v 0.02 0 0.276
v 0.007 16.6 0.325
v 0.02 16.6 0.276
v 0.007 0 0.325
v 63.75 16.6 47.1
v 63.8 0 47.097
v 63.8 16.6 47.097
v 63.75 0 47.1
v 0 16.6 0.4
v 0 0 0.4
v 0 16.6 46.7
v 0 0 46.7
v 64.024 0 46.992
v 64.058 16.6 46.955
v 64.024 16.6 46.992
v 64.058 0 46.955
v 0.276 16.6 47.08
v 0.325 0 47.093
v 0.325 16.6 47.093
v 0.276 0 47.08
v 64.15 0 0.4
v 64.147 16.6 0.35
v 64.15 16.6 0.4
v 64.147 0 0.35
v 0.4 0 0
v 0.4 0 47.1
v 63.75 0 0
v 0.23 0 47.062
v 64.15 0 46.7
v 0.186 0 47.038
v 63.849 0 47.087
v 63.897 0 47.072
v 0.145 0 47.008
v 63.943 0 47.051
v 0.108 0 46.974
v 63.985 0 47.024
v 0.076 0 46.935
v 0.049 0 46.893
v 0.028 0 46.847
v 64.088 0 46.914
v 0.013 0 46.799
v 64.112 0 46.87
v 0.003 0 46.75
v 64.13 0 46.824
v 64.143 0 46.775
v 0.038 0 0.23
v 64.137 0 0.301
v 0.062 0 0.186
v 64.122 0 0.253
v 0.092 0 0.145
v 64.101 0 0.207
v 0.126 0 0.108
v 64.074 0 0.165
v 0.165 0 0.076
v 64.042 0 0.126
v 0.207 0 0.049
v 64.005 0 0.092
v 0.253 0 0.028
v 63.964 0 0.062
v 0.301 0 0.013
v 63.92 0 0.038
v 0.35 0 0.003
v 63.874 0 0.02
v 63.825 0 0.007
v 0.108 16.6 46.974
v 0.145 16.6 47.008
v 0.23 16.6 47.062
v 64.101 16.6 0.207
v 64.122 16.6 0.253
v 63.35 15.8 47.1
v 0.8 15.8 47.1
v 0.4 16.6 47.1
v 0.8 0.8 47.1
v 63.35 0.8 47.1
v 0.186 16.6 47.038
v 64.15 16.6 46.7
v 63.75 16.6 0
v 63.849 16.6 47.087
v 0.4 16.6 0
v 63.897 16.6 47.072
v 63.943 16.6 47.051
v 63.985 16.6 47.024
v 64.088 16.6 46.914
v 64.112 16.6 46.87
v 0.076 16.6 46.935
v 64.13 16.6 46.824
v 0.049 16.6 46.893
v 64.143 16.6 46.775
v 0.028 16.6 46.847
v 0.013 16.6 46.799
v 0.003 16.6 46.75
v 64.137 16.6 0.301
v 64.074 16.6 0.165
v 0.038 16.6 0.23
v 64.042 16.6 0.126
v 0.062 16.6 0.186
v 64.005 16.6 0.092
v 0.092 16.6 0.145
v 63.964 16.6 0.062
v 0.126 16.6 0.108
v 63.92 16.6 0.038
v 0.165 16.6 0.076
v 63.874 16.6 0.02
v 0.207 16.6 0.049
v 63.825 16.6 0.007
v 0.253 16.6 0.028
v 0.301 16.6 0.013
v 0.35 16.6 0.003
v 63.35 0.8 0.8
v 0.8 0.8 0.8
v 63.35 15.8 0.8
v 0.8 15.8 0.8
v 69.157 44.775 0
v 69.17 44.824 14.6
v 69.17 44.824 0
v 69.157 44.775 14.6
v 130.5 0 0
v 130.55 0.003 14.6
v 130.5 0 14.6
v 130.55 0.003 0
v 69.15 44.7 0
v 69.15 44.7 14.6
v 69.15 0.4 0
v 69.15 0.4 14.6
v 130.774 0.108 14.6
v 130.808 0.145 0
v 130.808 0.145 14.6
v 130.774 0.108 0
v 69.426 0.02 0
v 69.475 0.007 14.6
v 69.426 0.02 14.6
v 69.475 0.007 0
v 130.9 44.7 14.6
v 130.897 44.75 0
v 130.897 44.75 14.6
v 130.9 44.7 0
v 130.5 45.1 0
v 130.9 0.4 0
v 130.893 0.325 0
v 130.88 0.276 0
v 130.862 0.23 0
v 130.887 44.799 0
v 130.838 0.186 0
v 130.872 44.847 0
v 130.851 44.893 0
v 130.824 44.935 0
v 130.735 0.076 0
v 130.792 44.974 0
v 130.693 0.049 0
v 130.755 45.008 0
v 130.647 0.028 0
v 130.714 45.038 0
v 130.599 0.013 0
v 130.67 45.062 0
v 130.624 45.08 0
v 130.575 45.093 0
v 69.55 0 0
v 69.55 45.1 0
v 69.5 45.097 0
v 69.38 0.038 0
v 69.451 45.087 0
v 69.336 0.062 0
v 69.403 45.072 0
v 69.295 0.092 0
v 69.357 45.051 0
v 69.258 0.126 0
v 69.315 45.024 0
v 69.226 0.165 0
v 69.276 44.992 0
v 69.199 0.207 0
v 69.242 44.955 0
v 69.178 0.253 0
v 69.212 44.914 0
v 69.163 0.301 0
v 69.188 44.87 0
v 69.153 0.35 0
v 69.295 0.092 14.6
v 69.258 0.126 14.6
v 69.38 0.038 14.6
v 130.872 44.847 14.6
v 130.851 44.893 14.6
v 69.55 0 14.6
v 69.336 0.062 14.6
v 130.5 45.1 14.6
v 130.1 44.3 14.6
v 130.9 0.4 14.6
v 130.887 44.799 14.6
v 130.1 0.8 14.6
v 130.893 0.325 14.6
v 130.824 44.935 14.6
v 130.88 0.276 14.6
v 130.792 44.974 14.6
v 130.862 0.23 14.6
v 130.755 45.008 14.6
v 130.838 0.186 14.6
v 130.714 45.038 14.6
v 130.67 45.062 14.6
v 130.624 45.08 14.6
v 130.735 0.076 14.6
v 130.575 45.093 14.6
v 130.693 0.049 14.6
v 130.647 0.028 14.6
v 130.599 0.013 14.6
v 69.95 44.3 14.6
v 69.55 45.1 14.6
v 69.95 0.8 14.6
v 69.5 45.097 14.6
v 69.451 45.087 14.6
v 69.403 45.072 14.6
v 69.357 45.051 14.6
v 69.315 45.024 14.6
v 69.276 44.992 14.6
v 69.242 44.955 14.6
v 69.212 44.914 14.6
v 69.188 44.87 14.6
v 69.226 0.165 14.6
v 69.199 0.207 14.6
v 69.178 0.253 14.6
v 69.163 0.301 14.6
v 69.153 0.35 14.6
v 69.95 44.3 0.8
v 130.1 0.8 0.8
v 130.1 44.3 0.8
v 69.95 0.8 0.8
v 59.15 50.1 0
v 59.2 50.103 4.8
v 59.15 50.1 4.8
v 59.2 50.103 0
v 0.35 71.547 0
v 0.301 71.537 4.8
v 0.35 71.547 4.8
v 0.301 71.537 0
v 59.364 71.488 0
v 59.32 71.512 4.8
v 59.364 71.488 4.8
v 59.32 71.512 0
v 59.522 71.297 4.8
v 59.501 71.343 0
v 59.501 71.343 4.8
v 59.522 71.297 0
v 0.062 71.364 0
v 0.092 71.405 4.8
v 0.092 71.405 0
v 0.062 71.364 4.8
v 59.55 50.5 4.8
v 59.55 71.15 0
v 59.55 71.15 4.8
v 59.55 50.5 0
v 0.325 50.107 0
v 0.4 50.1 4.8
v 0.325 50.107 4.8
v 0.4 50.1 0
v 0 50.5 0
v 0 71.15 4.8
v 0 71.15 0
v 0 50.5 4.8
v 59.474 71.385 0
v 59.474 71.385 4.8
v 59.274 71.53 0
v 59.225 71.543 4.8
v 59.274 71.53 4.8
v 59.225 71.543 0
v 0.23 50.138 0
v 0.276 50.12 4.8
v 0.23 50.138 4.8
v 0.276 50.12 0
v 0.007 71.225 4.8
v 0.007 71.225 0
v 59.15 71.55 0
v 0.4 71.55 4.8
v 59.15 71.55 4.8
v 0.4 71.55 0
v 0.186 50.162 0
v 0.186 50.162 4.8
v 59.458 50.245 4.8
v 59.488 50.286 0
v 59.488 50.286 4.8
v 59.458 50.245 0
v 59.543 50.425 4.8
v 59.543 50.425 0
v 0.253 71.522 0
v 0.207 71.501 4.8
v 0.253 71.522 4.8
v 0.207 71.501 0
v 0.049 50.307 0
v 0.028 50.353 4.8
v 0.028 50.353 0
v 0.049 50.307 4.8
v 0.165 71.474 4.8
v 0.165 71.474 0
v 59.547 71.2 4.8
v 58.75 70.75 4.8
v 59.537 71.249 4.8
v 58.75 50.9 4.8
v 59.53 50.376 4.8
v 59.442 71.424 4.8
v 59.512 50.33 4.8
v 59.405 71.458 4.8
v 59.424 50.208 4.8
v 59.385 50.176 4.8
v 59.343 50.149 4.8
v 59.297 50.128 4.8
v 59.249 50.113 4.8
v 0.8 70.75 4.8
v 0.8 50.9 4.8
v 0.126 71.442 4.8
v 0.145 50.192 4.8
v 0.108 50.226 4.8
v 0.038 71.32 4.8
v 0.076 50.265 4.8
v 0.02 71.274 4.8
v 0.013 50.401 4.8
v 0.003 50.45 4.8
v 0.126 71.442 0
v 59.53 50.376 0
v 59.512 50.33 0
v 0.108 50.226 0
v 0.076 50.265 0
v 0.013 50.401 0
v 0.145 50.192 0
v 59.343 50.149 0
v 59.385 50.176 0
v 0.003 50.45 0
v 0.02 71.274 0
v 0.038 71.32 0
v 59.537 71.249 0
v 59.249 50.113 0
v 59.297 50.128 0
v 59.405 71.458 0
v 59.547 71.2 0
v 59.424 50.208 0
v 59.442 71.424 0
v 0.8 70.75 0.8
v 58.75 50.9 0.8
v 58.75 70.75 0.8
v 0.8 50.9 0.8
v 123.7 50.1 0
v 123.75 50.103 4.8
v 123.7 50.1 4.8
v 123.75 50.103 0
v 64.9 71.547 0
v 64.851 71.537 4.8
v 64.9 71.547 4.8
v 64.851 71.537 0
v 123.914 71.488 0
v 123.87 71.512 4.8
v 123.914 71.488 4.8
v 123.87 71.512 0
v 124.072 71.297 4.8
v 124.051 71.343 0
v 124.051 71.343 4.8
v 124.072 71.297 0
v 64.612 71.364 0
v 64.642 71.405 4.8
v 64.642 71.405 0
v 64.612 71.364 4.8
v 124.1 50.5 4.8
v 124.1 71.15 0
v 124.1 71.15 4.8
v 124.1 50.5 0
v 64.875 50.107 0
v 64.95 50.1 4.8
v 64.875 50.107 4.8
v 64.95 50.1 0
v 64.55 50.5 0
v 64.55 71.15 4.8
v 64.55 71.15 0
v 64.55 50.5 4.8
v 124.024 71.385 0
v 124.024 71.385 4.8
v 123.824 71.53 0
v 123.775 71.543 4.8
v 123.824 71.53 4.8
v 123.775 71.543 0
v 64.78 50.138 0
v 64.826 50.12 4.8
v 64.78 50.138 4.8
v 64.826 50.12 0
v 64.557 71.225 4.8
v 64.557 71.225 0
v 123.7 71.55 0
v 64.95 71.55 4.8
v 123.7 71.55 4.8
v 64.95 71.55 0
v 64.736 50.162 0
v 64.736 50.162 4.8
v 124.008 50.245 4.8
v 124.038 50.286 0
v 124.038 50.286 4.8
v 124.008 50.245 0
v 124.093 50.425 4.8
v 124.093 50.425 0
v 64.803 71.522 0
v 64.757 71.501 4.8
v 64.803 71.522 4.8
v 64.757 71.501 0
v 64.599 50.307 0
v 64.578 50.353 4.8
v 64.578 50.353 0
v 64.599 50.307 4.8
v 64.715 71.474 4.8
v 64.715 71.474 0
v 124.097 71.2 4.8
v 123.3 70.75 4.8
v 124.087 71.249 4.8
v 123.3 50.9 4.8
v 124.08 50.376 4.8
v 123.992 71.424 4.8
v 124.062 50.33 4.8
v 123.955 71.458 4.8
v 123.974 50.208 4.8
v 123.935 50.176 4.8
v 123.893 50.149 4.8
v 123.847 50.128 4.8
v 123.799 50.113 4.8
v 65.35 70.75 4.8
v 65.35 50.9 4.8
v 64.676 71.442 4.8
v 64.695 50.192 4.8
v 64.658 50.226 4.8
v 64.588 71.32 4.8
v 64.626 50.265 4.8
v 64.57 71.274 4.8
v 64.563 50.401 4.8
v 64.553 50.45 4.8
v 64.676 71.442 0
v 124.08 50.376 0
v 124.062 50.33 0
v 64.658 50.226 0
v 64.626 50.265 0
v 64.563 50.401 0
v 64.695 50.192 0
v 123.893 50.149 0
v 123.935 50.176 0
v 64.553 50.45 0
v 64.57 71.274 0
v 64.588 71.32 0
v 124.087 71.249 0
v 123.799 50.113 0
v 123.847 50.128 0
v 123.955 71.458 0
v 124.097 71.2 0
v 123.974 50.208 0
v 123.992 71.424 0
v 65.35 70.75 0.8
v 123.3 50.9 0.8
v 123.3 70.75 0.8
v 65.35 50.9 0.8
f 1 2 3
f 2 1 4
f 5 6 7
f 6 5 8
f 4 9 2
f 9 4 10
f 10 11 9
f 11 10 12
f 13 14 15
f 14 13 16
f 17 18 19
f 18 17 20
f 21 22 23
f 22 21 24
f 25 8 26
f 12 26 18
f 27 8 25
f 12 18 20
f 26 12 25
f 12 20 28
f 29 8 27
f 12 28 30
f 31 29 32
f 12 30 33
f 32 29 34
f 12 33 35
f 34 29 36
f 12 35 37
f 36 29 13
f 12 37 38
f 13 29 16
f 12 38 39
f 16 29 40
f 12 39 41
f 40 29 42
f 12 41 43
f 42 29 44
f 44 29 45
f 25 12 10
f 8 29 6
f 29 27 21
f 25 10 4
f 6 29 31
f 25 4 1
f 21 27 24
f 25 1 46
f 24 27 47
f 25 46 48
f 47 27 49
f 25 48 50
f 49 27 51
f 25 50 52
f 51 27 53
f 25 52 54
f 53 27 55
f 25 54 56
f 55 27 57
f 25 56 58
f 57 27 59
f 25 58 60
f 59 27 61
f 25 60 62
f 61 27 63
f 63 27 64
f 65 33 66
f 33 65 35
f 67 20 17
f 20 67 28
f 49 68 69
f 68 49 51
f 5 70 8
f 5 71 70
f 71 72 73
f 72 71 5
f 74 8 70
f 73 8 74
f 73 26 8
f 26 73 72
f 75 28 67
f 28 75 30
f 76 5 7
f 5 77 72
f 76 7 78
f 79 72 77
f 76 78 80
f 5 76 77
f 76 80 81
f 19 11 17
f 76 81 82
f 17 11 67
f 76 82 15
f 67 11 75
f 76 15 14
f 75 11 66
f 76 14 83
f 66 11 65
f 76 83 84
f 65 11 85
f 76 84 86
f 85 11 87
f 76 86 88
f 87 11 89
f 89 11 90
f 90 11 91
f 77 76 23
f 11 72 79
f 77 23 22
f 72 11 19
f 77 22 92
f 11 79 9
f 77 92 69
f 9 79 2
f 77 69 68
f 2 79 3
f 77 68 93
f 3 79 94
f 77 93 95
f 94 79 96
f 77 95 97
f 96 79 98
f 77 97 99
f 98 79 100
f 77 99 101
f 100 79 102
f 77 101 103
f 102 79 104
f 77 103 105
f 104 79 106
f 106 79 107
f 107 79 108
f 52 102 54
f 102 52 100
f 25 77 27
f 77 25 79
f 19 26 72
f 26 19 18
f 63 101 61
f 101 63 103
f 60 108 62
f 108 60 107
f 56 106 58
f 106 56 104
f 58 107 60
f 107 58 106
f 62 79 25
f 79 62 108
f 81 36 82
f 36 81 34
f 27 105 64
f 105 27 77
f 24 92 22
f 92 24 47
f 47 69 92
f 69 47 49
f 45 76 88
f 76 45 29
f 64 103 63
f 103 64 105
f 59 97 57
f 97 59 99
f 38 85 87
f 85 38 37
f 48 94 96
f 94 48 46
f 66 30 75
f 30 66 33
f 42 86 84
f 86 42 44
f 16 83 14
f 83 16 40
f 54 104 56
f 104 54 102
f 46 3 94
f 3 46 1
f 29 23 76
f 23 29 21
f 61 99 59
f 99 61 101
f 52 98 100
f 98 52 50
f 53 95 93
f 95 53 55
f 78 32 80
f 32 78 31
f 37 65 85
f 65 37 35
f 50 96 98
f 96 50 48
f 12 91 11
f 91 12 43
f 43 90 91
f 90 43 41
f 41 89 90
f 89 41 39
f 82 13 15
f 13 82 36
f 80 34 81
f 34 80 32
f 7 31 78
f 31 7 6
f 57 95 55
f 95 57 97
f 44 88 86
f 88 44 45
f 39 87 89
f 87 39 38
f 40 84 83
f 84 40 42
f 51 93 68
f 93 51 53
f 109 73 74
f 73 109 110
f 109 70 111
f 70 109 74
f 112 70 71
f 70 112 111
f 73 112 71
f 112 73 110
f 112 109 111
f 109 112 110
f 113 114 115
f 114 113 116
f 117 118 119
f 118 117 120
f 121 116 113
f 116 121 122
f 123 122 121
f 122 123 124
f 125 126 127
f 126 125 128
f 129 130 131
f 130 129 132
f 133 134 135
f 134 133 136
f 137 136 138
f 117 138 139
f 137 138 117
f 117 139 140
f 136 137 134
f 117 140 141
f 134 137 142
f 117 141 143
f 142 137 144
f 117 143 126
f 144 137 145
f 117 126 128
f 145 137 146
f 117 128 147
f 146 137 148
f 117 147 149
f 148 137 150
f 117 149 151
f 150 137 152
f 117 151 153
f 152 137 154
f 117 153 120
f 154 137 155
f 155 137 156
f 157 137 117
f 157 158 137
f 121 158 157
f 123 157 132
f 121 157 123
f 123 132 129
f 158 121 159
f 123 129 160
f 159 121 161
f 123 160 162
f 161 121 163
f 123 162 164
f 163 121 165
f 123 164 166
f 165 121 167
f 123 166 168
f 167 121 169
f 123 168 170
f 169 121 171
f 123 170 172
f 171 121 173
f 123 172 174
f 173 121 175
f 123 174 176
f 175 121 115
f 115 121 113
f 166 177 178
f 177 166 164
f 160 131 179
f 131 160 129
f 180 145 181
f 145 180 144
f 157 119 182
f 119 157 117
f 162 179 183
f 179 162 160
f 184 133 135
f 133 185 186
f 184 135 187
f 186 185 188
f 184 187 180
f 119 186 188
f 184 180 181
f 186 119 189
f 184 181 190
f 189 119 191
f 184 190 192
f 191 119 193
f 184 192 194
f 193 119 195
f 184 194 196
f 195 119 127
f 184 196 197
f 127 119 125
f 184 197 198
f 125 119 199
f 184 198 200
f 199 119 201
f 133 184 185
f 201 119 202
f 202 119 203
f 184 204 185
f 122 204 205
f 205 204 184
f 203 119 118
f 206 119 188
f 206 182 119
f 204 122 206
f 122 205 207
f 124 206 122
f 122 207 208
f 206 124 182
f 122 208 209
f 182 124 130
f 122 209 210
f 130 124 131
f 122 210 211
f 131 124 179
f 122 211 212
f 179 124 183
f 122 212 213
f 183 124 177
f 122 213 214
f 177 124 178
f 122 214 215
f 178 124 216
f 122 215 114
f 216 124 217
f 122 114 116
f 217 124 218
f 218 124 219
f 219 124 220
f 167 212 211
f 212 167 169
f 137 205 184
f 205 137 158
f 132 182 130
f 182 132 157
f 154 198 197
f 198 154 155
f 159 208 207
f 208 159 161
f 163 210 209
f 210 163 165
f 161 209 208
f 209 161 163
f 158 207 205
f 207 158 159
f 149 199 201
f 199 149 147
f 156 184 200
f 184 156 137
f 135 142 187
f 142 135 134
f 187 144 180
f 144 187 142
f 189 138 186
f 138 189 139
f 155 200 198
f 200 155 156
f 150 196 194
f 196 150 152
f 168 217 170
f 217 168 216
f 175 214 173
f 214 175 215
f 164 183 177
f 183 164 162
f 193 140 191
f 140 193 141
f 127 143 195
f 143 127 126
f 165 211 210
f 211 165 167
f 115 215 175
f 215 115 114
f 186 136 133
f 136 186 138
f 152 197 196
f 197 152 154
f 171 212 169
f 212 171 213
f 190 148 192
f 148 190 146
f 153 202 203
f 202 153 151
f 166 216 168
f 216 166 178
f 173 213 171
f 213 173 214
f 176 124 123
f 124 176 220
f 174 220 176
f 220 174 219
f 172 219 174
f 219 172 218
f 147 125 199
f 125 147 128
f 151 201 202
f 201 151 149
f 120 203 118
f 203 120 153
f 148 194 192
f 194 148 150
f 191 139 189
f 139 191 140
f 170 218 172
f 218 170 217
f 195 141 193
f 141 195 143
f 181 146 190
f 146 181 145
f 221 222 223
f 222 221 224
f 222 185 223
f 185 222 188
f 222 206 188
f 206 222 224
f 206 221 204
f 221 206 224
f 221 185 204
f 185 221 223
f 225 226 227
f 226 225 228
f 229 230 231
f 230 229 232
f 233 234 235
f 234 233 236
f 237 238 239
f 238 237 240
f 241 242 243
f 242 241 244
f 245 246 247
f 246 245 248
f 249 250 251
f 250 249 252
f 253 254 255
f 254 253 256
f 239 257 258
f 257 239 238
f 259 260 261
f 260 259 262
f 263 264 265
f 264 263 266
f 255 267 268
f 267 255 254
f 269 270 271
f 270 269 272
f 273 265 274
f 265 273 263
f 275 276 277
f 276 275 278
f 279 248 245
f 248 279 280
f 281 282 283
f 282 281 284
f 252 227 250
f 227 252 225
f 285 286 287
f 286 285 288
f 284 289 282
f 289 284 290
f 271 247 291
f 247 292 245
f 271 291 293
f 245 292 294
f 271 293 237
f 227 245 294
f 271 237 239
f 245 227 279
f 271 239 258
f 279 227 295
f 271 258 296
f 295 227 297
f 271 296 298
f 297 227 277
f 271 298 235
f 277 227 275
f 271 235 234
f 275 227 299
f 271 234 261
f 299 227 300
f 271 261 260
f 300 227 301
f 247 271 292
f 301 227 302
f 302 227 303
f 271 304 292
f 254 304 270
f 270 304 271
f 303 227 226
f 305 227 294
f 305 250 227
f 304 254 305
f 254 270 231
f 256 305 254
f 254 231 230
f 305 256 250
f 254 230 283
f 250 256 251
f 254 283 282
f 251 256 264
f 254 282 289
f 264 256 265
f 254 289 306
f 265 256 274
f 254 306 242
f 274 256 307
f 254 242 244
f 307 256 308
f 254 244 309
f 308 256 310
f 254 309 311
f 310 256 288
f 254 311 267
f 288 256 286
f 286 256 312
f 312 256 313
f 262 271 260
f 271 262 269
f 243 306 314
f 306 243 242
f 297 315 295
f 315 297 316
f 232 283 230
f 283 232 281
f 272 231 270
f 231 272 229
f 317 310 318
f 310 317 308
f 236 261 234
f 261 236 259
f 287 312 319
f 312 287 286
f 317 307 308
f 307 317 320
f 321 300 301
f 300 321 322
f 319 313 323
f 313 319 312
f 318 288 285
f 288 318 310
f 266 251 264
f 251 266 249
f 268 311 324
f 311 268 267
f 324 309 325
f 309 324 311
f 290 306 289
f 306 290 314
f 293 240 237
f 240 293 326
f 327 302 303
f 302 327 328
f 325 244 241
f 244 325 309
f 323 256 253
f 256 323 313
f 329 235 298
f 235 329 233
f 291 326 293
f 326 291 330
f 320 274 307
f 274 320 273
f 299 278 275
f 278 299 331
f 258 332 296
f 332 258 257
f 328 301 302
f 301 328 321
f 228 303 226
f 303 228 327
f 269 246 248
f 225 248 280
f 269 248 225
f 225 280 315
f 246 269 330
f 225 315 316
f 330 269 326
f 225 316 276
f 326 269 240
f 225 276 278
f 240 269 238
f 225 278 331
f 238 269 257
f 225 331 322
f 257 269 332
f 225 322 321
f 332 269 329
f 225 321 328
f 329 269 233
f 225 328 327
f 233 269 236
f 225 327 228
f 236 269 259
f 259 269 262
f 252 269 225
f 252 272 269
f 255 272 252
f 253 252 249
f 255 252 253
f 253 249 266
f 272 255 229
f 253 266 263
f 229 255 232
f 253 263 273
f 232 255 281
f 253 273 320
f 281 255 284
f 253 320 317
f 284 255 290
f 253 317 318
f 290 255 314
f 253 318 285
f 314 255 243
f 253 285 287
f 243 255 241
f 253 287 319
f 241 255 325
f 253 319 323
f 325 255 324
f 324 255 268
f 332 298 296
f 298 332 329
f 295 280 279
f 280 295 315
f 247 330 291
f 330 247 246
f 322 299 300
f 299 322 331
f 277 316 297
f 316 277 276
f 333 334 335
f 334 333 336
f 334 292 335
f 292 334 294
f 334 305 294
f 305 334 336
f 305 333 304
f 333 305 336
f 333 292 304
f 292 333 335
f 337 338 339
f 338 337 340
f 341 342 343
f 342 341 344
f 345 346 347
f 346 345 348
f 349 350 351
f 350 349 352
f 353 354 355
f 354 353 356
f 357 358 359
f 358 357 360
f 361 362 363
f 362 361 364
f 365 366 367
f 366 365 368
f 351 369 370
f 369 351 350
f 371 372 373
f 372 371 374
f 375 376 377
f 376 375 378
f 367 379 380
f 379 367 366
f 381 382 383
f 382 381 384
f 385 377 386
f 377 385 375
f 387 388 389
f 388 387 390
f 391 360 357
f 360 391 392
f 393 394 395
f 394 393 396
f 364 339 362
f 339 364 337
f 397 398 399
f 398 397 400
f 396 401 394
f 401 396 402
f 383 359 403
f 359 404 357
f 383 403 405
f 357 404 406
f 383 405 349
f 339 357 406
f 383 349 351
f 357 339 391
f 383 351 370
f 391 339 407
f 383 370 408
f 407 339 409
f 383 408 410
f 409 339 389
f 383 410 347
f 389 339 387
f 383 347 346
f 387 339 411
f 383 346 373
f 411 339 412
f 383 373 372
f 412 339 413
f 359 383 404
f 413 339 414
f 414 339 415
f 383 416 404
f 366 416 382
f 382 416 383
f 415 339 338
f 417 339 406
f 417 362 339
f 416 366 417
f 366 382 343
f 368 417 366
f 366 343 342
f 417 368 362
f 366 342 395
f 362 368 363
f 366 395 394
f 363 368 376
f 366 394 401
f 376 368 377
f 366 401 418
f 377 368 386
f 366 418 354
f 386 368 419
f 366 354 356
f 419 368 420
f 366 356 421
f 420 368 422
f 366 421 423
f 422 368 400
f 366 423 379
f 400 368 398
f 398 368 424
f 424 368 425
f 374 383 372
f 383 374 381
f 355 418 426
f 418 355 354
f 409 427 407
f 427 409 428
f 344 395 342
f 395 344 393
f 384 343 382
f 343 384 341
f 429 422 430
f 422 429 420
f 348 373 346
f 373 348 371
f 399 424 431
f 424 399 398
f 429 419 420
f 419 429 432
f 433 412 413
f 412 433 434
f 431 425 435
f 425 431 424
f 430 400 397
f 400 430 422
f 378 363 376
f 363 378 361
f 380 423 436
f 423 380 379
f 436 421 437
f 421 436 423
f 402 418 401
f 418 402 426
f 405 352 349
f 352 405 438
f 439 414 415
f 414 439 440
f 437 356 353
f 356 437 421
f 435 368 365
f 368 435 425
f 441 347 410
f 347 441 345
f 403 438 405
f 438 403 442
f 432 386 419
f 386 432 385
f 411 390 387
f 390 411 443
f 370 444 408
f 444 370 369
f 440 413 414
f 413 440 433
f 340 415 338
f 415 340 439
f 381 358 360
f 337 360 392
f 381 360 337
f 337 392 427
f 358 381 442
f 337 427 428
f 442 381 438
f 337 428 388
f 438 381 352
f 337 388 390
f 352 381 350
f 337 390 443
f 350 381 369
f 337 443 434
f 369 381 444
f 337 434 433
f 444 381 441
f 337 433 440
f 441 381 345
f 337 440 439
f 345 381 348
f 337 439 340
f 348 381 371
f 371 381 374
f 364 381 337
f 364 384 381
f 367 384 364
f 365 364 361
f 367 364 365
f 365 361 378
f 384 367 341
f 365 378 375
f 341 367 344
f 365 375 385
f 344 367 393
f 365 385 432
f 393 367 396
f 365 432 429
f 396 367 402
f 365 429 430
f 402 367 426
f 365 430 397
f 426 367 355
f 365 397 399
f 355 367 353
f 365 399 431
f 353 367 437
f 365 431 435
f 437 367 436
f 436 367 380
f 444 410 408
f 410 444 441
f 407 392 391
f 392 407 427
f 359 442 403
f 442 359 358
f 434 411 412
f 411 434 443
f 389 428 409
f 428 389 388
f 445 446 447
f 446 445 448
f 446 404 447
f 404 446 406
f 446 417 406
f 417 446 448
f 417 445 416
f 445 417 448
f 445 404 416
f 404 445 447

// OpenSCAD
/* [Print Layout] */

// Preview the parts in the optimal orientation for 3D printing.
print_orientation = true; // [true, false]
// Additional spacing between key trays in print orientation to prevent brim collision.
print_tray_spacing_mm = 5; // [0:1:50]

// printer bed dimensions
printer = "p1s"; // [p1s, ender3v2]
bed_x_mm = printer == "p1s" ? 250 : 220;
bed_y_mm = printer == "p1s" ? 250 : 220;

/* [Key Profile] */

// Select the key spacing standard used to size each tray footprint.
key_profile = "mx"; // [mx, choc]

/* [3D Printing] */

// 3D printing settings and validation.
nozzle_width_mm = 0.4; // [0.2:0.05:1.0]

// Shared wall and floor dimensions.
wall_lines = 2; // [1:1:5]
floor_layers = 2; // [1:1:5]

// Effective print dimensions.
effective_wall_thickness_mm = wall_lines * nozzle_width_mm;
effective_floor_thickness_mm = floor_layers * nozzle_width_mm;

assert(nozzle_width_mm > 0, "nozzle_width_mm must be greater than 0");
assert(wall_lines > 0, "wall_lines must be greater than 0");
assert(floor_layers > 0, "floor_layers must be greater than 0");
assert(default_clearance_mm >= 0, "default_clearance_mm must be non-negative");

/* [Clearance] */

// General fit clearance applied to most nested parts.
default_clearance_mm = 0.4; // [0:0.05:1.0]
// Fit clearance around the tray container inside the drawer.
drawer_clearance_mm = 0.4; // [0:0.05:1.0]
// Fit clearance around individual trays inside the container.
tray_container_clearance_mm = 0.3; // [0:0.05:1.0]

/* [Key Trays] */

// Layout sizing: trays span the full row width/depth, with one tray per row.
tray_orientation = "width"; // [width, length]
tray_count = [3, 2]; // [1:1:12]

// Tray-specific sizing controls.
keycap_height_preset = "OEM"; // [Custom, SA, OEM, Cherry, XDA, DSA, G20]
custom_max_keycap_height_mm = 17; // [6:0.1:20]
max_keycap_height_mm =
  keycap_height_preset == "SA" ? 16.5
  : keycap_height_preset == "OEM" ? 11.9
  : keycap_height_preset == "Cherry" ? 9.4
  : keycap_height_preset == "XDA" ? 9.1
  : keycap_height_preset == "DSA" ? 7.6
  : keycap_height_preset == "G20" ? 7.6
  : custom_max_keycap_height_mm;
tray_lip_height_mm = 4; // [1:0.5:20]
tray_length_u = 1; // [1:1:8]

/* [Advanced Geometry] */

// Tiny vertical corner rounding to smooth toolpaths without materially changing fit.
vertical_corner_radius_mm = 0.4; // [0:0.05:1.0]

/* [Key Tray Spacing] */

// Standard key spacing dimensions.
mx_key_spacing_mm = 19.05; // [18:0.05:20]
choc_key_spacing_x_mm = 18; // [16:0.05:20]
choc_key_spacing_y_mm = 17; // [16:0.05:20]

/* [Hidden] */

// Spread the drawer, container, and trays apart for inspection.
debug_exploded_view = false; // [true, false]
debug_explode_distance_mm = print_tray_spacing_mm; // [0:1:100]

fancy_render = true;
$fn = fancy_render ? 50 : 10;

// Resolve the active spacing from the selected key profile.
key_spacing_x_mm = key_profile == "mx" ? mx_key_spacing_mm : choc_key_spacing_x_mm;
key_spacing_y_mm = key_profile == "mx" ? mx_key_spacing_mm : choc_key_spacing_y_mm;

// A tray is fixed to 1u in y, while row width in x and lip height in z remain parametric.
row_tray_width_u = tray_orientation == "width" ? tray_count[0] : tray_length_u;
row_tray_length_u = tray_orientation == "width" ? tray_length_u : tray_count[1];
tray_height_mm = tray_lip_height_mm;
stack_height_mm = max_keycap_height_mm + default_clearance_mm * 2;

// Inner tray envelope sized around one row-wide tray footprint plus fit clearance.
tray_inner_x_mm = key_spacing_x_mm * row_tray_width_u + default_clearance_mm * 2;
tray_inner_y_mm = key_spacing_y_mm * row_tray_length_u + default_clearance_mm * 2;
tray_inner_z_mm = tray_height_mm;

// Outer tray shell dimensions.
tray_outer_x_mm = tray_inner_x_mm + effective_wall_thickness_mm * 2;
tray_outer_y_mm = tray_inner_y_mm + effective_wall_thickness_mm * 2;
tray_outer_z_mm = tray_inner_z_mm + effective_floor_thickness_mm;
tray_outer_corner_radius_mm = min(vertical_corner_radius_mm, min(tray_outer_x_mm, tray_outer_y_mm) / 2);
tray_inner_corner_radius_mm = max(0, tray_outer_corner_radius_mm - effective_wall_thickness_mm);

// Container inner cavity sized to receive one tray per row and the full key stack height.
tray_container_inner_x_mm =
  tray_orientation == "width" ?
    tray_outer_x_mm + tray_container_clearance_mm * 2
  : tray_outer_x_mm * tray_count[0] + tray_container_clearance_mm * 2;
tray_container_inner_y_mm =
  tray_orientation == "width" ?
    tray_outer_y_mm * tray_count[1] + tray_container_clearance_mm * 2
  : tray_outer_y_mm + tray_container_clearance_mm * 2;
tray_container_inner_z_mm = stack_height_mm + effective_floor_thickness_mm + tray_container_clearance_mm;

// Outer container shell dimensions.
tray_container_outer_x_mm = tray_container_inner_x_mm + effective_wall_thickness_mm * 2;
tray_container_outer_y_mm = tray_container_inner_y_mm + effective_wall_thickness_mm * 2;
tray_container_outer_z_mm = tray_container_inner_z_mm + effective_floor_thickness_mm;
tray_container_outer_corner_radius_mm = min(vertical_corner_radius_mm, min(tray_container_outer_x_mm, tray_container_outer_y_mm) / 2);
tray_container_inner_corner_radius_mm = max(0, tray_container_outer_corner_radius_mm - effective_wall_thickness_mm);

// Drawer inner cavity sized to receive the tray container from the front.
drawer_inner_x_mm = tray_container_outer_x_mm + drawer_clearance_mm * 2;
drawer_inner_y_mm = tray_container_outer_y_mm + drawer_clearance_mm + effective_wall_thickness_mm;
drawer_inner_z_mm = tray_container_outer_z_mm + drawer_clearance_mm;

// Outer drawer shell dimensions.
drawer_outer_x_mm = drawer_inner_x_mm + effective_wall_thickness_mm * 2;
drawer_outer_y_mm = drawer_inner_y_mm + effective_wall_thickness_mm;
drawer_outer_z_mm = drawer_inner_z_mm + effective_floor_thickness_mm + effective_wall_thickness_mm;
drawer_outer_corner_radius_mm = min(vertical_corner_radius_mm, min(drawer_outer_x_mm, drawer_outer_y_mm) / 2);
drawer_inner_corner_radius_mm = max(0, drawer_outer_corner_radius_mm - effective_wall_thickness_mm);

// Build a rounded rectangular prism with tiny fillets on the vertical corners.
module rounded_rect_prism(size, radius) {
  linear_extrude(height=size[2])
    offset(r=radius)
      translate([radius, radius])
        square(
          [
            max(0.01, size[0] - radius * 2),
            max(0.01, size[1] - radius * 2),
          ]
        );
}

// Build a single open-top tray.
module key_tray() {
  difference() {
    rounded_rect_prism(
      [tray_outer_x_mm, tray_outer_y_mm, tray_outer_z_mm],
      tray_outer_corner_radius_mm
    );
    translate([effective_wall_thickness_mm, effective_wall_thickness_mm, effective_floor_thickness_mm])
      rounded_rect_prism(
        [tray_inner_x_mm, tray_inner_y_mm, tray_inner_z_mm],
        tray_inner_corner_radius_mm
      );
  }
}

// Build the open-top container shell that holds one or more trays.
module tray_container() {
  difference() {
    rounded_rect_prism(
      [tray_container_outer_x_mm, tray_container_outer_y_mm, tray_container_outer_z_mm],
      tray_container_outer_corner_radius_mm
    );
    translate([effective_wall_thickness_mm, effective_wall_thickness_mm, effective_floor_thickness_mm])
      rounded_rect_prism(
        [tray_container_inner_x_mm, tray_container_inner_y_mm, tray_container_inner_z_mm],
        tray_container_inner_corner_radius_mm
      );
  }
}

// Build the outer drawer shell with a front opening for the tray container.
module outer_drawer() {
  difference() {
    rounded_rect_prism(
      [drawer_outer_x_mm, drawer_outer_y_mm, drawer_outer_z_mm],
      drawer_outer_corner_radius_mm
    );
    translate([effective_wall_thickness_mm, 0, effective_floor_thickness_mm])
      rounded_rect_prism(
        [drawer_inner_x_mm, drawer_inner_y_mm, drawer_inner_z_mm],
        drawer_inner_corner_radius_mm
      );
  }
}

// Place one tray in each row so the tray width follows the container width.
module tray_container_layout() {
  if (tray_orientation == "width") {
    for (iy = [0:tray_count[1] - 1]) {
      translate(
        [
          effective_wall_thickness_mm + tray_container_clearance_mm,
          effective_wall_thickness_mm + tray_container_clearance_mm + iy * tray_outer_y_mm,
          effective_floor_thickness_mm,
        ]
      )
        key_tray();
    }
  } else {
    for (ix = [0:tray_count[0] - 1]) {
      translate(
        [
          effective_wall_thickness_mm + tray_container_clearance_mm + ix * tray_outer_x_mm,
          effective_wall_thickness_mm + tray_container_clearance_mm,
          effective_floor_thickness_mm,
        ]
      )
        key_tray();
    }
  }
}

// Preview the fitted relationship between the tray container and its trays.
module tray_container_assembly() {
  tray_container();
  tray_container_layout();
}

// Preview the drawer, container, and trays separated for easier inspection.
module exploded_drawer_assembly() {
  outer_drawer();
  translate(
    [
      drawer_outer_x_mm + debug_explode_distance_mm,
      0,
      0,
    ]
  )
    tray_container();
  translate(
    [
      drawer_outer_x_mm + tray_container_outer_x_mm + debug_explode_distance_mm * 2,
      0,
      0,
    ]
  )
    tray_container_layout();
}

// Preview the fitted relationship between the drawer, container, and trays.
module drawer_assembly() {
  outer_drawer();
  translate(
    [
      effective_wall_thickness_mm + drawer_clearance_mm,
      0,
      effective_floor_thickness_mm,
    ]
  )
    tray_container_assembly();
}

module print_drawer_assembly() {
  num_trays = tray_orientation == "width" ? tray_count[1] : tray_count[0];

  // 1. Drawer goes first, bottom-left
  // It is rotated so it stands on its back.
  drawer_print_x = drawer_outer_x_mm;
  drawer_print_y = drawer_outer_z_mm; // Z becomes Y after rotation

  translate([0, 0, drawer_outer_y_mm])
    rotate([-90, 0, 0])
      outer_drawer();

  // 2. Container
  // If it fits next to the drawer, put it there, otherwise stack above
  container_fits_x = (drawer_print_x + print_tray_spacing_mm + tray_container_outer_x_mm) <= bed_x_mm;
  container_x = container_fits_x ? drawer_print_x + print_tray_spacing_mm : 0;
  container_y = container_fits_x ? 0 : drawer_print_y + print_tray_spacing_mm;

  translate([container_x, container_y, 0])
    tray_container();

  // 3. Trays (arranged in a grid)
  trays_start_y = max(
    drawer_print_y,
    container_y + tray_container_outer_y_mm
  ) + print_tray_spacing_mm;

  trays_per_row = max(1, floor((bed_x_mm + print_tray_spacing_mm) / (tray_outer_x_mm + print_tray_spacing_mm)));

  for (i = [0:num_trays - 1]) {
    col = i % trays_per_row;
    row = floor(i / trays_per_row);
    translate(
      [
        col * (tray_outer_x_mm + print_tray_spacing_mm),
        trays_start_y + row * (tray_outer_y_mm + print_tray_spacing_mm),
        0,
      ]
    )
      key_tray();
  }
}

if (print_orientation) {
  print_drawer_assembly();
} else if (debug_exploded_view) {
  exploded_drawer_assembly();
} else {
  drawer_assembly();
}
